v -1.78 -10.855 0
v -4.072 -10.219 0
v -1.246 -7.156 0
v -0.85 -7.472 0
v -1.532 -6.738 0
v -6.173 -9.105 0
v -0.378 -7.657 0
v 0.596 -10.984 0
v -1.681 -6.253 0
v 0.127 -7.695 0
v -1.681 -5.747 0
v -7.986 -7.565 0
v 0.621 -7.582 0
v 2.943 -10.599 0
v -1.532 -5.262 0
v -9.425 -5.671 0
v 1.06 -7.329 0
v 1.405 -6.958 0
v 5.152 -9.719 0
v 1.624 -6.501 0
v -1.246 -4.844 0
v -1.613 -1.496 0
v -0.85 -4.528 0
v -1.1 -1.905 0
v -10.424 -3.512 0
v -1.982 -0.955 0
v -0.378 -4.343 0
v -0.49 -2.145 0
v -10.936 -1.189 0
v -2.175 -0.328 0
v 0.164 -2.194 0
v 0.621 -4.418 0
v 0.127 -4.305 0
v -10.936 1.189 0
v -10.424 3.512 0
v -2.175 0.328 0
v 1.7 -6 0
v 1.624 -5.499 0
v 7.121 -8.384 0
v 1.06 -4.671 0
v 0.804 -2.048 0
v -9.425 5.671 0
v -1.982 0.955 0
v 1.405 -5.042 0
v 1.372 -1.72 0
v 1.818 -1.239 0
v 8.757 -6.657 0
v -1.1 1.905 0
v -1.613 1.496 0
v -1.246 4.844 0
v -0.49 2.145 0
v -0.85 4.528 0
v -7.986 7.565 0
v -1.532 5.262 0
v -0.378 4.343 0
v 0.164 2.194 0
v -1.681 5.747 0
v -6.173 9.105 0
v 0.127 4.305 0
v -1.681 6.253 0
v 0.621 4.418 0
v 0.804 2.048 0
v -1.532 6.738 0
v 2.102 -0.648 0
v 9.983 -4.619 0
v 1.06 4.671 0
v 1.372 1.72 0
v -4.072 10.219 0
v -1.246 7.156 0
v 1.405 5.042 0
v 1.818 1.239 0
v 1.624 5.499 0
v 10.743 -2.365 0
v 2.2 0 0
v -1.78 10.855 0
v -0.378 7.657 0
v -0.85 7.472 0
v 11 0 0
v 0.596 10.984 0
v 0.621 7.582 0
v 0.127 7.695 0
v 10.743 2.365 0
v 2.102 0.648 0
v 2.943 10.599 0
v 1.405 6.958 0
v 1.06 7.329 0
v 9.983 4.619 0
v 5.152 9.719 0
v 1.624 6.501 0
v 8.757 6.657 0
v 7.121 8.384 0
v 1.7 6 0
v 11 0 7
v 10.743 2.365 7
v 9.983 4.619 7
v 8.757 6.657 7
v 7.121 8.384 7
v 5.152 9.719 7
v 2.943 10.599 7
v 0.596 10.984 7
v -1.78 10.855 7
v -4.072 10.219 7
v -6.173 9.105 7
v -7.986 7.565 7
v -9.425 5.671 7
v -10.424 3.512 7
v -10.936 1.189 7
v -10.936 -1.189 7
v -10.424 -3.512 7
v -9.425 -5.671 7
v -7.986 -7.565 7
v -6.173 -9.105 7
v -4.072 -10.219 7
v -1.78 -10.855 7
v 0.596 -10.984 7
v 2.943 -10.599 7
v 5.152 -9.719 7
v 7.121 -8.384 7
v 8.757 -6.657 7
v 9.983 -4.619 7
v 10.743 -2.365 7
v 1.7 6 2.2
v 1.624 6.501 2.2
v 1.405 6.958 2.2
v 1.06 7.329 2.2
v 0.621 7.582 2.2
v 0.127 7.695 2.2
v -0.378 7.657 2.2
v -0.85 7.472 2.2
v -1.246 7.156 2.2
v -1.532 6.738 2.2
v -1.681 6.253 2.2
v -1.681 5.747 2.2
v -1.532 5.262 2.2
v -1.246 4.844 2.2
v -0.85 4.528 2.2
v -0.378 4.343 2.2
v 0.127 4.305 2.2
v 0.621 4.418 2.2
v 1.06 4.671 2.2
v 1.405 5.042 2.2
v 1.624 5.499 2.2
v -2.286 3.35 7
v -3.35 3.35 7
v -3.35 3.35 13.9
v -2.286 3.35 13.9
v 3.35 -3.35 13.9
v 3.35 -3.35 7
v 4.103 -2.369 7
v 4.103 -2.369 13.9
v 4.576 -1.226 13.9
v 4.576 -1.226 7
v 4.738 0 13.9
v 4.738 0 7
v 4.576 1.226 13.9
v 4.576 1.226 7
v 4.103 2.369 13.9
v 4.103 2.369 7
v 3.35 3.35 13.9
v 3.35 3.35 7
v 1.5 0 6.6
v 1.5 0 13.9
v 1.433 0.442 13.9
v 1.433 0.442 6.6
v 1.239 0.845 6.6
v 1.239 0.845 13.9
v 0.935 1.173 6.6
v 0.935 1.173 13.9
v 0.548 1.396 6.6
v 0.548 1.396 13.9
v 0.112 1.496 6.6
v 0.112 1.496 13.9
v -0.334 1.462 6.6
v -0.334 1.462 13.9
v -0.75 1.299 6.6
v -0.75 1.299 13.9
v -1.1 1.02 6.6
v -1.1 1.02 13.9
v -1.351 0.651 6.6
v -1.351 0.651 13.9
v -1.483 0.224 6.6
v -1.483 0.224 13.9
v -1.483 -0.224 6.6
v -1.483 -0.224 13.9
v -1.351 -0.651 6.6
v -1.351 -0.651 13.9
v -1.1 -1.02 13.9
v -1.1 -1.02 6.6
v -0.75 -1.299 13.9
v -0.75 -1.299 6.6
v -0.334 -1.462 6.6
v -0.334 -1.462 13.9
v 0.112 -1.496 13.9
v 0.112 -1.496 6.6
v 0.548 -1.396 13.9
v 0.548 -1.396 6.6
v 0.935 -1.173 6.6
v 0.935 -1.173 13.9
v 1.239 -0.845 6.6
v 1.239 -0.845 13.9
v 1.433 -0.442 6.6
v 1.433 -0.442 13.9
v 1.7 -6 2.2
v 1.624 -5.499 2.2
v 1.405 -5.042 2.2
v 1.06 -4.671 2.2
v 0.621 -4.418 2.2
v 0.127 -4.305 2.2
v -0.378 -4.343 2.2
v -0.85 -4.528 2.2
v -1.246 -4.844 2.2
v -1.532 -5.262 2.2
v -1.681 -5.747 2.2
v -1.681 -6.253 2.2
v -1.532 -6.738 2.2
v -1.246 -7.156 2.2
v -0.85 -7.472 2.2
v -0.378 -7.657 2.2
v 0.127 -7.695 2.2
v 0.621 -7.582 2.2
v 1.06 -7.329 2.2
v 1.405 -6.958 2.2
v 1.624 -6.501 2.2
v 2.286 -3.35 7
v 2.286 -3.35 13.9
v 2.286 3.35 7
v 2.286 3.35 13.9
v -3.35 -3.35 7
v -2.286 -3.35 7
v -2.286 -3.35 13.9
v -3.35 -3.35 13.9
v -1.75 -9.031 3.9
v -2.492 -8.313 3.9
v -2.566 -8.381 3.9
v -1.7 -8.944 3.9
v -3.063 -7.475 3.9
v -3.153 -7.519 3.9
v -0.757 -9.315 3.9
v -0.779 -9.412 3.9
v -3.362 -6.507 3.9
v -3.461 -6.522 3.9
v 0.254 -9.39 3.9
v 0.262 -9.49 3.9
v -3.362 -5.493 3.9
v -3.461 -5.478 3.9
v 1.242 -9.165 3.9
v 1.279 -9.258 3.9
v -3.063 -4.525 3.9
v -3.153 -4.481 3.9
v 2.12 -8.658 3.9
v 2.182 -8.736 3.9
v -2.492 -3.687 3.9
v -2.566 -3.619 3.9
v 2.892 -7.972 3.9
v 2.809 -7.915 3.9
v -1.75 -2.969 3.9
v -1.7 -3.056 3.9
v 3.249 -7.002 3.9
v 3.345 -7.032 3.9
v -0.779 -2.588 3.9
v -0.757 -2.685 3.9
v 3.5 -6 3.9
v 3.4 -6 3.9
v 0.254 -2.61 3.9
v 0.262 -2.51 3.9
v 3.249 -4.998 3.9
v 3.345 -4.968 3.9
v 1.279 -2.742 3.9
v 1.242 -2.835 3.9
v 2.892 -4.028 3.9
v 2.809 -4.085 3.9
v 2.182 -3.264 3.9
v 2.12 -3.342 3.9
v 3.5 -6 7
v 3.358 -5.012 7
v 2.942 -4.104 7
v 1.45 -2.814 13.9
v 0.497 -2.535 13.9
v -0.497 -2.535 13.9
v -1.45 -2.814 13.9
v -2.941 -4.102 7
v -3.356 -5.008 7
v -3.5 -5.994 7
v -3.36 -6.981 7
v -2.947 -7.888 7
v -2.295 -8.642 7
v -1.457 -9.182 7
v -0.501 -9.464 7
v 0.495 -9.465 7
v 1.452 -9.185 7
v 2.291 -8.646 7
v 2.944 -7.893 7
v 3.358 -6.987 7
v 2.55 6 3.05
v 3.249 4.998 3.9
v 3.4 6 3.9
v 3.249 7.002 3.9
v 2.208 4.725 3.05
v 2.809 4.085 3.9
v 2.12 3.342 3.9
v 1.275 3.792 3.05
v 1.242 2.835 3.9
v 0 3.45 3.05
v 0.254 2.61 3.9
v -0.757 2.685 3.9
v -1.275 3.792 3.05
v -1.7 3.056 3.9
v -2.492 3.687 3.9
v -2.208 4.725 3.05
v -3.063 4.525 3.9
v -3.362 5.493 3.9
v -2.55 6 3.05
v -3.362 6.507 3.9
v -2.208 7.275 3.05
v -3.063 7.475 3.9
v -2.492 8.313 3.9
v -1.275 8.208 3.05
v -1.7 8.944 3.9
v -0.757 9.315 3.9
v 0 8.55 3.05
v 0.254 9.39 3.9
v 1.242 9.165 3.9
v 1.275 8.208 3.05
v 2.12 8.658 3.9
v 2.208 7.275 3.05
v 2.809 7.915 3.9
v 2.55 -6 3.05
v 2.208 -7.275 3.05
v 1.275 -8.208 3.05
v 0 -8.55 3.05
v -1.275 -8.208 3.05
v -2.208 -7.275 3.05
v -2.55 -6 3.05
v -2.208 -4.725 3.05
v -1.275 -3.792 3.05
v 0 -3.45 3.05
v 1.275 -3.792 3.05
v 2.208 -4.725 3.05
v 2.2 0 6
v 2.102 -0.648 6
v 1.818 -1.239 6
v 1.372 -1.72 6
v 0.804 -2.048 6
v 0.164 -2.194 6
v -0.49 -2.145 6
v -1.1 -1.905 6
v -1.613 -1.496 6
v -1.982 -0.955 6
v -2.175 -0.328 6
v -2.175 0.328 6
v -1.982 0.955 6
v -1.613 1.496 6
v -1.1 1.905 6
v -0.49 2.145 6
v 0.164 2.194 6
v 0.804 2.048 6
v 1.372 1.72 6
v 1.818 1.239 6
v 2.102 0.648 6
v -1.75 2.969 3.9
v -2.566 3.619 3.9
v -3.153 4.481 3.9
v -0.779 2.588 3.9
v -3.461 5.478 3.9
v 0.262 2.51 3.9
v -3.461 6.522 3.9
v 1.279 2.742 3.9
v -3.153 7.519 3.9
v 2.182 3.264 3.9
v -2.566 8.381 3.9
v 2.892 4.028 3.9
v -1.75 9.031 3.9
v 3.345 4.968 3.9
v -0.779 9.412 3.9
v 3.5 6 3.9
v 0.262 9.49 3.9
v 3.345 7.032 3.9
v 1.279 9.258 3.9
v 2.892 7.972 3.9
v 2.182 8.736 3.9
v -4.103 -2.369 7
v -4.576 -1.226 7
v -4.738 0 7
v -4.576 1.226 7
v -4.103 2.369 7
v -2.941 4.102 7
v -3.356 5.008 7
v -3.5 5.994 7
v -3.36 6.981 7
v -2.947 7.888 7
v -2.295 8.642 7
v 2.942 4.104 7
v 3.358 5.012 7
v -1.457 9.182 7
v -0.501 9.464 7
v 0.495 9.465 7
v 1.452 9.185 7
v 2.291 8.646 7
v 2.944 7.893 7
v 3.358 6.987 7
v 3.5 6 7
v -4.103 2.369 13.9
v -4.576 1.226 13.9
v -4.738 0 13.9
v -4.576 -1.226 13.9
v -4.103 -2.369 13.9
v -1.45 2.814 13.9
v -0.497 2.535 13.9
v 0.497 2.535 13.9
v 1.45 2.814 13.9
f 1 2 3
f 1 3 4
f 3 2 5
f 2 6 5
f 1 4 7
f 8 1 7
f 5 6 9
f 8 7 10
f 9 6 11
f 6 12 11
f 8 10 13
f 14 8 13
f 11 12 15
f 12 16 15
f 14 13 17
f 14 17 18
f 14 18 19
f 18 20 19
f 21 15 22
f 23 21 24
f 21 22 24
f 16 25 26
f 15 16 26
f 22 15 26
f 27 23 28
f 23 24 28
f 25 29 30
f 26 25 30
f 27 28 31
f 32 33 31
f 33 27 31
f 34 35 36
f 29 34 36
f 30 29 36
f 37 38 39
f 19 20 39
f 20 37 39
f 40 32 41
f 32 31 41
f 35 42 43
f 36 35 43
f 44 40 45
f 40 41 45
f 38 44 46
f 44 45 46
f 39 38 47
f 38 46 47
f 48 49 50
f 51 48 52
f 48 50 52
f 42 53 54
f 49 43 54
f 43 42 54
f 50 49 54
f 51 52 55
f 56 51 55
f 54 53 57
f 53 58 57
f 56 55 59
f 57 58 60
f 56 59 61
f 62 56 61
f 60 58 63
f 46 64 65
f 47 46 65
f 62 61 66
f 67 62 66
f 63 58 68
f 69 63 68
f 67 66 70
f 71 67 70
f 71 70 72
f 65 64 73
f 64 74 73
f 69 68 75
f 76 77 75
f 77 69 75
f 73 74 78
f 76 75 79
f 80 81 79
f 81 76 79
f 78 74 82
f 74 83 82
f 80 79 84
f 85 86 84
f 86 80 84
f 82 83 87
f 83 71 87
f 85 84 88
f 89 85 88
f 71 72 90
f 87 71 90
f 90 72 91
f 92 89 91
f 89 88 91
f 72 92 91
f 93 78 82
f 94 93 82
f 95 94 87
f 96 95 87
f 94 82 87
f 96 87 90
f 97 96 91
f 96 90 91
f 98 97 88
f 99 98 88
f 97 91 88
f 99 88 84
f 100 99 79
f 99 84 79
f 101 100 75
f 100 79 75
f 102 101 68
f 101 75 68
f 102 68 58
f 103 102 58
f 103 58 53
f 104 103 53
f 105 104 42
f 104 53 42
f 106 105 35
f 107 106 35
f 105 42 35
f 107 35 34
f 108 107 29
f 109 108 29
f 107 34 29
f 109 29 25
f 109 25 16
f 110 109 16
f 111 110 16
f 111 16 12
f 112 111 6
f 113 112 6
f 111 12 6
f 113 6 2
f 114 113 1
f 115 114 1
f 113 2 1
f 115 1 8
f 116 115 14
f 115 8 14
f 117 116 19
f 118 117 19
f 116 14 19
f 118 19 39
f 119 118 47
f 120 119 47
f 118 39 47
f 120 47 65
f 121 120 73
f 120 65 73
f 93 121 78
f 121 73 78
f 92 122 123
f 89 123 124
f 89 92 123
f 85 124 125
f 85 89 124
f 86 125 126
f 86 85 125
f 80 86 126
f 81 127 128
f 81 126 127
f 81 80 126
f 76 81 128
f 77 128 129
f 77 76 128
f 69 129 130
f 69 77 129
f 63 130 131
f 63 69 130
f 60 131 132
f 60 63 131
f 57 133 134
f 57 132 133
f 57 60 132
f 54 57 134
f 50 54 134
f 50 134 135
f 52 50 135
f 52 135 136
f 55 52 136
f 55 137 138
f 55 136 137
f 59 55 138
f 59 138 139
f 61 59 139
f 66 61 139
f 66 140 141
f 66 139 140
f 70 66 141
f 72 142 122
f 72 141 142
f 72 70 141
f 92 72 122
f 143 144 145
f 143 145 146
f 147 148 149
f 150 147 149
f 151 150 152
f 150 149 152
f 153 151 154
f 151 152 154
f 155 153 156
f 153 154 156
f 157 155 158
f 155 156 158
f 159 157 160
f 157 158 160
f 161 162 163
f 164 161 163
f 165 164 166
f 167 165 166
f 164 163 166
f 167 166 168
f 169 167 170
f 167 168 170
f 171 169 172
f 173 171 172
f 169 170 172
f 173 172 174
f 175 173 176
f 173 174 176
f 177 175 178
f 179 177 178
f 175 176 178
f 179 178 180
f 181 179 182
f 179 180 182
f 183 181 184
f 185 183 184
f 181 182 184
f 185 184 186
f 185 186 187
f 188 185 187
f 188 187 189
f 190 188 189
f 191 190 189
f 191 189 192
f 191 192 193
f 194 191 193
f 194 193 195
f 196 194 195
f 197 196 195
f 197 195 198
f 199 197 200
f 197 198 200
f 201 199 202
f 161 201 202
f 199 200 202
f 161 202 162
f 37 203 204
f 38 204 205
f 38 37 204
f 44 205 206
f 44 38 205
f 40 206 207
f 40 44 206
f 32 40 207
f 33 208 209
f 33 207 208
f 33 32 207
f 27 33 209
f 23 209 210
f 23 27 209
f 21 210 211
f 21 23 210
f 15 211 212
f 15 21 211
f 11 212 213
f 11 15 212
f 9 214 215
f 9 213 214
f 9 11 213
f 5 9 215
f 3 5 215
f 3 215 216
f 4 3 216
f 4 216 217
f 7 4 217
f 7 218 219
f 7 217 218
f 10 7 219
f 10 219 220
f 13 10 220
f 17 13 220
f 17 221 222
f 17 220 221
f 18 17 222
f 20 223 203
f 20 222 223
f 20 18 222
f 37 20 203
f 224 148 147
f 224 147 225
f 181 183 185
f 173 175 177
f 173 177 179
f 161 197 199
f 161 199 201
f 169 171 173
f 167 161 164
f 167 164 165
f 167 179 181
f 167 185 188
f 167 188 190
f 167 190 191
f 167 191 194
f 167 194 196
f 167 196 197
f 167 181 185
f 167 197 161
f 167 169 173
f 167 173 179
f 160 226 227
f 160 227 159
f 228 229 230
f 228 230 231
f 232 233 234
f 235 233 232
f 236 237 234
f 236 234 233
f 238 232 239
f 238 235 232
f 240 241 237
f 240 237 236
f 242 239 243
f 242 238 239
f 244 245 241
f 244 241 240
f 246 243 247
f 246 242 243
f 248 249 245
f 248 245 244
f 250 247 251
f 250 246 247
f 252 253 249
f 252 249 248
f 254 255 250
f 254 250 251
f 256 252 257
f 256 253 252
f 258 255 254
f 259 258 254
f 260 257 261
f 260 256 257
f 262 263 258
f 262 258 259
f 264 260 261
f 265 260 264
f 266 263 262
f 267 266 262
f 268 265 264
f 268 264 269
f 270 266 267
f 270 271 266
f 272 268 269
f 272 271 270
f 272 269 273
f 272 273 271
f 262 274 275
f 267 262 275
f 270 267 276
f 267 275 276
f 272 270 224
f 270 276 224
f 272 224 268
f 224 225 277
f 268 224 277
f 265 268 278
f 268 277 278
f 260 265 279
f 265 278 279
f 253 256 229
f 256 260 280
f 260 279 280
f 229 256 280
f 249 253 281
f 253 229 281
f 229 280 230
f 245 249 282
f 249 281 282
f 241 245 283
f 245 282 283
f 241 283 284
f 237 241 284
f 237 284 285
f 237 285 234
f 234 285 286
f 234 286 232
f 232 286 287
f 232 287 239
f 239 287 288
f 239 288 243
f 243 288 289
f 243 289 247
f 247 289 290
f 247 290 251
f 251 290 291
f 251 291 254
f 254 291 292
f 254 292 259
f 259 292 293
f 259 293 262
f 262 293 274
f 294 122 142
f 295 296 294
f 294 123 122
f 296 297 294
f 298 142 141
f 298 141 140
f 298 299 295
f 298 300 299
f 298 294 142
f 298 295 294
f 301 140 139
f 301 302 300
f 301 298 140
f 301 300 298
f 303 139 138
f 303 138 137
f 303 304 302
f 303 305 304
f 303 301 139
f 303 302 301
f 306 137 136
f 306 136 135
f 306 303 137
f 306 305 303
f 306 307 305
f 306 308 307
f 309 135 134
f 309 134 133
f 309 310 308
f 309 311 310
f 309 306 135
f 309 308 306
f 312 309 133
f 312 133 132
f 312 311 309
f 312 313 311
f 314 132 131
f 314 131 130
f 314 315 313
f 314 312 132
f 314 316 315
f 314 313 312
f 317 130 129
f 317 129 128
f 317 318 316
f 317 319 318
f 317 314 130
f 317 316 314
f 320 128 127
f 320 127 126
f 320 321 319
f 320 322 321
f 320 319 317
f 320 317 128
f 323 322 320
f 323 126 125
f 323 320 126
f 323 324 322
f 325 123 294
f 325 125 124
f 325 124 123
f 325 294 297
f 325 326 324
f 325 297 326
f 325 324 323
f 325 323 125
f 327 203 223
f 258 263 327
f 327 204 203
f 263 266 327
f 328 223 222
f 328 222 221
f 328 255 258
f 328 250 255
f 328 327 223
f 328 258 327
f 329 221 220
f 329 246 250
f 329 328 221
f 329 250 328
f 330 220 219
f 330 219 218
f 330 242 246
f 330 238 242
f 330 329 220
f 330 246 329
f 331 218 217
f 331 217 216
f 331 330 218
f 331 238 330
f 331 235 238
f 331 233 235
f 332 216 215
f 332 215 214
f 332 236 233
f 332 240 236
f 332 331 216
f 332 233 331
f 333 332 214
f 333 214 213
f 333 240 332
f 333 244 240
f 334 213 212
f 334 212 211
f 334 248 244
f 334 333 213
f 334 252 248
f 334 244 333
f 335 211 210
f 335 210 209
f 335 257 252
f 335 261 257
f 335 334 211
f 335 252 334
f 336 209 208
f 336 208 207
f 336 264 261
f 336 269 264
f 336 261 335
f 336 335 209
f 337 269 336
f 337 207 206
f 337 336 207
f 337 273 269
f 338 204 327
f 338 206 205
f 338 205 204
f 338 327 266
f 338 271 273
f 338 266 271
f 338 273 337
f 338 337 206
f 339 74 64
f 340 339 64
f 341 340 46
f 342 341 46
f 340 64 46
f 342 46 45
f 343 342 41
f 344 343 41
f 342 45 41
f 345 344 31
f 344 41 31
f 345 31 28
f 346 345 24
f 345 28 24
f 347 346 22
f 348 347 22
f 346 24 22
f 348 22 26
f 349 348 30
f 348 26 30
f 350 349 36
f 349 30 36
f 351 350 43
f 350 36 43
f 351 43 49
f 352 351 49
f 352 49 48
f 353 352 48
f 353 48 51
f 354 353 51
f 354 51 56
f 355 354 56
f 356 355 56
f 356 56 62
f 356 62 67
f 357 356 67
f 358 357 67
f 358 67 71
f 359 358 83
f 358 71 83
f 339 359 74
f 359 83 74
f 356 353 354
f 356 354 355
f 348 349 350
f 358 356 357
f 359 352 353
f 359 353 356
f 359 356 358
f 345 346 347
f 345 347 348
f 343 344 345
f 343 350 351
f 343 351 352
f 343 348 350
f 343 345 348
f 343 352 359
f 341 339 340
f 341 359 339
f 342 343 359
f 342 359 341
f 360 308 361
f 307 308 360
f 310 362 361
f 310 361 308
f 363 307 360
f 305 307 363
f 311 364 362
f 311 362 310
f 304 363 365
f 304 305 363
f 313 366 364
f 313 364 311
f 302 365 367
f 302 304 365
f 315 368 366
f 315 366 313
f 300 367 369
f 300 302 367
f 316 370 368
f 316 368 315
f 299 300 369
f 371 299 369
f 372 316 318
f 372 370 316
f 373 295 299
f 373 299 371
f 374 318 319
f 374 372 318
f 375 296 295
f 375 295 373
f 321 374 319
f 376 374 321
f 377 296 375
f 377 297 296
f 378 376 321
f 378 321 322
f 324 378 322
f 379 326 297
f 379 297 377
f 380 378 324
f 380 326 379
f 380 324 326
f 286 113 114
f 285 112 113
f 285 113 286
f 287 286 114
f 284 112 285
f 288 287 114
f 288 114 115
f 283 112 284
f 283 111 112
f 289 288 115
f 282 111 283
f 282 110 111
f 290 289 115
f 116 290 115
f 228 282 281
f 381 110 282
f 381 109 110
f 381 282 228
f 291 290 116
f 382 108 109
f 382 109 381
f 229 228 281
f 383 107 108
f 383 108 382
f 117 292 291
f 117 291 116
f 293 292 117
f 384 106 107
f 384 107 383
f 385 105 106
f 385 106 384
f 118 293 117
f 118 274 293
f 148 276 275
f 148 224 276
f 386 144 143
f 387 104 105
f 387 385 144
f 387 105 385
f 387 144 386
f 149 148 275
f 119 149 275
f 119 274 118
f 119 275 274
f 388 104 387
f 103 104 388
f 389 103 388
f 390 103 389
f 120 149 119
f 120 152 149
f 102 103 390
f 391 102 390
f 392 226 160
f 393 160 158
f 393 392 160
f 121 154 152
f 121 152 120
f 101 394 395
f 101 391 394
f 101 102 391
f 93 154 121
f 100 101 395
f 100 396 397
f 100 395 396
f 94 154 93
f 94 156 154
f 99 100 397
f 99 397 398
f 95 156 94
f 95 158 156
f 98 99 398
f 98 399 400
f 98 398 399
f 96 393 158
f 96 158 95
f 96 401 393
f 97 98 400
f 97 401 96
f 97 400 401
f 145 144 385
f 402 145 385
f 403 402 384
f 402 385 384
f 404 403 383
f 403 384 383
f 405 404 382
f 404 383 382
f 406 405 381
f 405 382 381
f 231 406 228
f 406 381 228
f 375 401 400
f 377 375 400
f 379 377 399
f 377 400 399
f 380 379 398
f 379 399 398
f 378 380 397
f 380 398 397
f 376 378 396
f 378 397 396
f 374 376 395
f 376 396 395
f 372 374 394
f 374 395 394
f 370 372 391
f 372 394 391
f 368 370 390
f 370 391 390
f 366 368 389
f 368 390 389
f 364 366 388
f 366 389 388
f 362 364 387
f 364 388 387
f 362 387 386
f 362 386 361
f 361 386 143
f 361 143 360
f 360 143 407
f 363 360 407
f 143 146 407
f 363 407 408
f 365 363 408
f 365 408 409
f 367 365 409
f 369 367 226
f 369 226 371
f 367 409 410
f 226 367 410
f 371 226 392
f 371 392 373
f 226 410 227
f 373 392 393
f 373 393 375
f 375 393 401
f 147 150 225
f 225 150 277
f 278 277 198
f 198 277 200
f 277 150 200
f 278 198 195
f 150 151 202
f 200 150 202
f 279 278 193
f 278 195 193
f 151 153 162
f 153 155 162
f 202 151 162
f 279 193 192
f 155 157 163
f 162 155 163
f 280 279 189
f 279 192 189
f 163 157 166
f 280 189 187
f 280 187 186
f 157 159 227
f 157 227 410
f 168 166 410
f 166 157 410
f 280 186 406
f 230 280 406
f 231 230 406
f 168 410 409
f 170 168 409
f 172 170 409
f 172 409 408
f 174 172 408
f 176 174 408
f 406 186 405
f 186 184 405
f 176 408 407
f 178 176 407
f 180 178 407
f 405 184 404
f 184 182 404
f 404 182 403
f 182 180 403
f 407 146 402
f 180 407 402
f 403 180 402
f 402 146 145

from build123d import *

# Parameters (mm, degrees)
SKETCH_R        = 11
SKETCH_R_2      = 1.7
PAD_DEPTH       = 7
PAD001_DEPTH    = 6.9
SKETCH006_R     = 3.5
POCKET003_DEPTH = 10
SKETCH007_R     = 2.2
POCKET_DEPTH    = 6
SKETCH003_R     = 1.5
POCKET004_DEPTH = 7.3
CHAMFER_SIZE    = 1.7
CHAMFER001_SIZE = 1.7


with BuildPart() as part:
    # Sketch → Pad (new body)
    with BuildSketch(Plane.XY):
        Circle(SKETCH_R)
        with Locations((0, 6)):
            Circle(SKETCH_R_2, mode=Mode.SUBTRACT)
        with Locations((0, -6)):
            Circle(SKETCH_R_2, mode=Mode.SUBTRACT)
    extrude(amount=PAD_DEPTH)

    # Sketch004 → Pad001 (new body)
    with BuildSketch(Plane.XY.offset(7)):
        with BuildLine():
            Line((-3.35, 3.35), (3.35, 3.35))
            ThreePointArc((3.35, -3.35), (4.737615, 0), (3.35, 3.35))
            Line((3.35, -3.35), (-3.35, -3.35))
            ThreePointArc((-3.35, 3.35), (-4.737615, 0), (-3.35, -3.35))
        make_face()
    extrude(amount=PAD001_DEPTH)

    # Sketch006 → Pocket003 (cut)
    with BuildSketch(Plane.XY.offset(13.9)):
        with Locations((0, 6)):
            Circle(SKETCH006_R)
        with Locations((0, -6)):
            Circle(SKETCH006_R)
    extrude(amount=-POCKET003_DEPTH, mode=Mode.SUBTRACT)

    # Sketch007 → Pocket (cut)
    with BuildSketch(Plane(origin=(0, 0, 0), x_dir=(1, 0, 0), z_dir=(0, 0, -1))):
        Circle(SKETCH007_R)
    extrude(amount=-POCKET_DEPTH, mode=Mode.SUBTRACT)

    # Sketch003 → Pocket004 (cut)
    with BuildSketch(Plane.XY.offset(13.9)):
        Circle(SKETCH003_R)
    extrude(amount=-POCKET004_DEPTH, mode=Mode.SUBTRACT)

    # Chamfer
    chamfer_edges = [part.edges().sort_by_distance(p)[0] for p in [
        (-1.7, 6, 3.9),
    ]]
    chamfer(chamfer_edges, length=CHAMFER_SIZE)

    # Chamfer001
    chamfer001_edges = [part.edges().sort_by_distance(p)[0] for p in [
        (-1.7, -6, 3.9),
    ]]
    chamfer(chamfer001_edges, length=CHAMFER001_SIZE)


solid = part.part
